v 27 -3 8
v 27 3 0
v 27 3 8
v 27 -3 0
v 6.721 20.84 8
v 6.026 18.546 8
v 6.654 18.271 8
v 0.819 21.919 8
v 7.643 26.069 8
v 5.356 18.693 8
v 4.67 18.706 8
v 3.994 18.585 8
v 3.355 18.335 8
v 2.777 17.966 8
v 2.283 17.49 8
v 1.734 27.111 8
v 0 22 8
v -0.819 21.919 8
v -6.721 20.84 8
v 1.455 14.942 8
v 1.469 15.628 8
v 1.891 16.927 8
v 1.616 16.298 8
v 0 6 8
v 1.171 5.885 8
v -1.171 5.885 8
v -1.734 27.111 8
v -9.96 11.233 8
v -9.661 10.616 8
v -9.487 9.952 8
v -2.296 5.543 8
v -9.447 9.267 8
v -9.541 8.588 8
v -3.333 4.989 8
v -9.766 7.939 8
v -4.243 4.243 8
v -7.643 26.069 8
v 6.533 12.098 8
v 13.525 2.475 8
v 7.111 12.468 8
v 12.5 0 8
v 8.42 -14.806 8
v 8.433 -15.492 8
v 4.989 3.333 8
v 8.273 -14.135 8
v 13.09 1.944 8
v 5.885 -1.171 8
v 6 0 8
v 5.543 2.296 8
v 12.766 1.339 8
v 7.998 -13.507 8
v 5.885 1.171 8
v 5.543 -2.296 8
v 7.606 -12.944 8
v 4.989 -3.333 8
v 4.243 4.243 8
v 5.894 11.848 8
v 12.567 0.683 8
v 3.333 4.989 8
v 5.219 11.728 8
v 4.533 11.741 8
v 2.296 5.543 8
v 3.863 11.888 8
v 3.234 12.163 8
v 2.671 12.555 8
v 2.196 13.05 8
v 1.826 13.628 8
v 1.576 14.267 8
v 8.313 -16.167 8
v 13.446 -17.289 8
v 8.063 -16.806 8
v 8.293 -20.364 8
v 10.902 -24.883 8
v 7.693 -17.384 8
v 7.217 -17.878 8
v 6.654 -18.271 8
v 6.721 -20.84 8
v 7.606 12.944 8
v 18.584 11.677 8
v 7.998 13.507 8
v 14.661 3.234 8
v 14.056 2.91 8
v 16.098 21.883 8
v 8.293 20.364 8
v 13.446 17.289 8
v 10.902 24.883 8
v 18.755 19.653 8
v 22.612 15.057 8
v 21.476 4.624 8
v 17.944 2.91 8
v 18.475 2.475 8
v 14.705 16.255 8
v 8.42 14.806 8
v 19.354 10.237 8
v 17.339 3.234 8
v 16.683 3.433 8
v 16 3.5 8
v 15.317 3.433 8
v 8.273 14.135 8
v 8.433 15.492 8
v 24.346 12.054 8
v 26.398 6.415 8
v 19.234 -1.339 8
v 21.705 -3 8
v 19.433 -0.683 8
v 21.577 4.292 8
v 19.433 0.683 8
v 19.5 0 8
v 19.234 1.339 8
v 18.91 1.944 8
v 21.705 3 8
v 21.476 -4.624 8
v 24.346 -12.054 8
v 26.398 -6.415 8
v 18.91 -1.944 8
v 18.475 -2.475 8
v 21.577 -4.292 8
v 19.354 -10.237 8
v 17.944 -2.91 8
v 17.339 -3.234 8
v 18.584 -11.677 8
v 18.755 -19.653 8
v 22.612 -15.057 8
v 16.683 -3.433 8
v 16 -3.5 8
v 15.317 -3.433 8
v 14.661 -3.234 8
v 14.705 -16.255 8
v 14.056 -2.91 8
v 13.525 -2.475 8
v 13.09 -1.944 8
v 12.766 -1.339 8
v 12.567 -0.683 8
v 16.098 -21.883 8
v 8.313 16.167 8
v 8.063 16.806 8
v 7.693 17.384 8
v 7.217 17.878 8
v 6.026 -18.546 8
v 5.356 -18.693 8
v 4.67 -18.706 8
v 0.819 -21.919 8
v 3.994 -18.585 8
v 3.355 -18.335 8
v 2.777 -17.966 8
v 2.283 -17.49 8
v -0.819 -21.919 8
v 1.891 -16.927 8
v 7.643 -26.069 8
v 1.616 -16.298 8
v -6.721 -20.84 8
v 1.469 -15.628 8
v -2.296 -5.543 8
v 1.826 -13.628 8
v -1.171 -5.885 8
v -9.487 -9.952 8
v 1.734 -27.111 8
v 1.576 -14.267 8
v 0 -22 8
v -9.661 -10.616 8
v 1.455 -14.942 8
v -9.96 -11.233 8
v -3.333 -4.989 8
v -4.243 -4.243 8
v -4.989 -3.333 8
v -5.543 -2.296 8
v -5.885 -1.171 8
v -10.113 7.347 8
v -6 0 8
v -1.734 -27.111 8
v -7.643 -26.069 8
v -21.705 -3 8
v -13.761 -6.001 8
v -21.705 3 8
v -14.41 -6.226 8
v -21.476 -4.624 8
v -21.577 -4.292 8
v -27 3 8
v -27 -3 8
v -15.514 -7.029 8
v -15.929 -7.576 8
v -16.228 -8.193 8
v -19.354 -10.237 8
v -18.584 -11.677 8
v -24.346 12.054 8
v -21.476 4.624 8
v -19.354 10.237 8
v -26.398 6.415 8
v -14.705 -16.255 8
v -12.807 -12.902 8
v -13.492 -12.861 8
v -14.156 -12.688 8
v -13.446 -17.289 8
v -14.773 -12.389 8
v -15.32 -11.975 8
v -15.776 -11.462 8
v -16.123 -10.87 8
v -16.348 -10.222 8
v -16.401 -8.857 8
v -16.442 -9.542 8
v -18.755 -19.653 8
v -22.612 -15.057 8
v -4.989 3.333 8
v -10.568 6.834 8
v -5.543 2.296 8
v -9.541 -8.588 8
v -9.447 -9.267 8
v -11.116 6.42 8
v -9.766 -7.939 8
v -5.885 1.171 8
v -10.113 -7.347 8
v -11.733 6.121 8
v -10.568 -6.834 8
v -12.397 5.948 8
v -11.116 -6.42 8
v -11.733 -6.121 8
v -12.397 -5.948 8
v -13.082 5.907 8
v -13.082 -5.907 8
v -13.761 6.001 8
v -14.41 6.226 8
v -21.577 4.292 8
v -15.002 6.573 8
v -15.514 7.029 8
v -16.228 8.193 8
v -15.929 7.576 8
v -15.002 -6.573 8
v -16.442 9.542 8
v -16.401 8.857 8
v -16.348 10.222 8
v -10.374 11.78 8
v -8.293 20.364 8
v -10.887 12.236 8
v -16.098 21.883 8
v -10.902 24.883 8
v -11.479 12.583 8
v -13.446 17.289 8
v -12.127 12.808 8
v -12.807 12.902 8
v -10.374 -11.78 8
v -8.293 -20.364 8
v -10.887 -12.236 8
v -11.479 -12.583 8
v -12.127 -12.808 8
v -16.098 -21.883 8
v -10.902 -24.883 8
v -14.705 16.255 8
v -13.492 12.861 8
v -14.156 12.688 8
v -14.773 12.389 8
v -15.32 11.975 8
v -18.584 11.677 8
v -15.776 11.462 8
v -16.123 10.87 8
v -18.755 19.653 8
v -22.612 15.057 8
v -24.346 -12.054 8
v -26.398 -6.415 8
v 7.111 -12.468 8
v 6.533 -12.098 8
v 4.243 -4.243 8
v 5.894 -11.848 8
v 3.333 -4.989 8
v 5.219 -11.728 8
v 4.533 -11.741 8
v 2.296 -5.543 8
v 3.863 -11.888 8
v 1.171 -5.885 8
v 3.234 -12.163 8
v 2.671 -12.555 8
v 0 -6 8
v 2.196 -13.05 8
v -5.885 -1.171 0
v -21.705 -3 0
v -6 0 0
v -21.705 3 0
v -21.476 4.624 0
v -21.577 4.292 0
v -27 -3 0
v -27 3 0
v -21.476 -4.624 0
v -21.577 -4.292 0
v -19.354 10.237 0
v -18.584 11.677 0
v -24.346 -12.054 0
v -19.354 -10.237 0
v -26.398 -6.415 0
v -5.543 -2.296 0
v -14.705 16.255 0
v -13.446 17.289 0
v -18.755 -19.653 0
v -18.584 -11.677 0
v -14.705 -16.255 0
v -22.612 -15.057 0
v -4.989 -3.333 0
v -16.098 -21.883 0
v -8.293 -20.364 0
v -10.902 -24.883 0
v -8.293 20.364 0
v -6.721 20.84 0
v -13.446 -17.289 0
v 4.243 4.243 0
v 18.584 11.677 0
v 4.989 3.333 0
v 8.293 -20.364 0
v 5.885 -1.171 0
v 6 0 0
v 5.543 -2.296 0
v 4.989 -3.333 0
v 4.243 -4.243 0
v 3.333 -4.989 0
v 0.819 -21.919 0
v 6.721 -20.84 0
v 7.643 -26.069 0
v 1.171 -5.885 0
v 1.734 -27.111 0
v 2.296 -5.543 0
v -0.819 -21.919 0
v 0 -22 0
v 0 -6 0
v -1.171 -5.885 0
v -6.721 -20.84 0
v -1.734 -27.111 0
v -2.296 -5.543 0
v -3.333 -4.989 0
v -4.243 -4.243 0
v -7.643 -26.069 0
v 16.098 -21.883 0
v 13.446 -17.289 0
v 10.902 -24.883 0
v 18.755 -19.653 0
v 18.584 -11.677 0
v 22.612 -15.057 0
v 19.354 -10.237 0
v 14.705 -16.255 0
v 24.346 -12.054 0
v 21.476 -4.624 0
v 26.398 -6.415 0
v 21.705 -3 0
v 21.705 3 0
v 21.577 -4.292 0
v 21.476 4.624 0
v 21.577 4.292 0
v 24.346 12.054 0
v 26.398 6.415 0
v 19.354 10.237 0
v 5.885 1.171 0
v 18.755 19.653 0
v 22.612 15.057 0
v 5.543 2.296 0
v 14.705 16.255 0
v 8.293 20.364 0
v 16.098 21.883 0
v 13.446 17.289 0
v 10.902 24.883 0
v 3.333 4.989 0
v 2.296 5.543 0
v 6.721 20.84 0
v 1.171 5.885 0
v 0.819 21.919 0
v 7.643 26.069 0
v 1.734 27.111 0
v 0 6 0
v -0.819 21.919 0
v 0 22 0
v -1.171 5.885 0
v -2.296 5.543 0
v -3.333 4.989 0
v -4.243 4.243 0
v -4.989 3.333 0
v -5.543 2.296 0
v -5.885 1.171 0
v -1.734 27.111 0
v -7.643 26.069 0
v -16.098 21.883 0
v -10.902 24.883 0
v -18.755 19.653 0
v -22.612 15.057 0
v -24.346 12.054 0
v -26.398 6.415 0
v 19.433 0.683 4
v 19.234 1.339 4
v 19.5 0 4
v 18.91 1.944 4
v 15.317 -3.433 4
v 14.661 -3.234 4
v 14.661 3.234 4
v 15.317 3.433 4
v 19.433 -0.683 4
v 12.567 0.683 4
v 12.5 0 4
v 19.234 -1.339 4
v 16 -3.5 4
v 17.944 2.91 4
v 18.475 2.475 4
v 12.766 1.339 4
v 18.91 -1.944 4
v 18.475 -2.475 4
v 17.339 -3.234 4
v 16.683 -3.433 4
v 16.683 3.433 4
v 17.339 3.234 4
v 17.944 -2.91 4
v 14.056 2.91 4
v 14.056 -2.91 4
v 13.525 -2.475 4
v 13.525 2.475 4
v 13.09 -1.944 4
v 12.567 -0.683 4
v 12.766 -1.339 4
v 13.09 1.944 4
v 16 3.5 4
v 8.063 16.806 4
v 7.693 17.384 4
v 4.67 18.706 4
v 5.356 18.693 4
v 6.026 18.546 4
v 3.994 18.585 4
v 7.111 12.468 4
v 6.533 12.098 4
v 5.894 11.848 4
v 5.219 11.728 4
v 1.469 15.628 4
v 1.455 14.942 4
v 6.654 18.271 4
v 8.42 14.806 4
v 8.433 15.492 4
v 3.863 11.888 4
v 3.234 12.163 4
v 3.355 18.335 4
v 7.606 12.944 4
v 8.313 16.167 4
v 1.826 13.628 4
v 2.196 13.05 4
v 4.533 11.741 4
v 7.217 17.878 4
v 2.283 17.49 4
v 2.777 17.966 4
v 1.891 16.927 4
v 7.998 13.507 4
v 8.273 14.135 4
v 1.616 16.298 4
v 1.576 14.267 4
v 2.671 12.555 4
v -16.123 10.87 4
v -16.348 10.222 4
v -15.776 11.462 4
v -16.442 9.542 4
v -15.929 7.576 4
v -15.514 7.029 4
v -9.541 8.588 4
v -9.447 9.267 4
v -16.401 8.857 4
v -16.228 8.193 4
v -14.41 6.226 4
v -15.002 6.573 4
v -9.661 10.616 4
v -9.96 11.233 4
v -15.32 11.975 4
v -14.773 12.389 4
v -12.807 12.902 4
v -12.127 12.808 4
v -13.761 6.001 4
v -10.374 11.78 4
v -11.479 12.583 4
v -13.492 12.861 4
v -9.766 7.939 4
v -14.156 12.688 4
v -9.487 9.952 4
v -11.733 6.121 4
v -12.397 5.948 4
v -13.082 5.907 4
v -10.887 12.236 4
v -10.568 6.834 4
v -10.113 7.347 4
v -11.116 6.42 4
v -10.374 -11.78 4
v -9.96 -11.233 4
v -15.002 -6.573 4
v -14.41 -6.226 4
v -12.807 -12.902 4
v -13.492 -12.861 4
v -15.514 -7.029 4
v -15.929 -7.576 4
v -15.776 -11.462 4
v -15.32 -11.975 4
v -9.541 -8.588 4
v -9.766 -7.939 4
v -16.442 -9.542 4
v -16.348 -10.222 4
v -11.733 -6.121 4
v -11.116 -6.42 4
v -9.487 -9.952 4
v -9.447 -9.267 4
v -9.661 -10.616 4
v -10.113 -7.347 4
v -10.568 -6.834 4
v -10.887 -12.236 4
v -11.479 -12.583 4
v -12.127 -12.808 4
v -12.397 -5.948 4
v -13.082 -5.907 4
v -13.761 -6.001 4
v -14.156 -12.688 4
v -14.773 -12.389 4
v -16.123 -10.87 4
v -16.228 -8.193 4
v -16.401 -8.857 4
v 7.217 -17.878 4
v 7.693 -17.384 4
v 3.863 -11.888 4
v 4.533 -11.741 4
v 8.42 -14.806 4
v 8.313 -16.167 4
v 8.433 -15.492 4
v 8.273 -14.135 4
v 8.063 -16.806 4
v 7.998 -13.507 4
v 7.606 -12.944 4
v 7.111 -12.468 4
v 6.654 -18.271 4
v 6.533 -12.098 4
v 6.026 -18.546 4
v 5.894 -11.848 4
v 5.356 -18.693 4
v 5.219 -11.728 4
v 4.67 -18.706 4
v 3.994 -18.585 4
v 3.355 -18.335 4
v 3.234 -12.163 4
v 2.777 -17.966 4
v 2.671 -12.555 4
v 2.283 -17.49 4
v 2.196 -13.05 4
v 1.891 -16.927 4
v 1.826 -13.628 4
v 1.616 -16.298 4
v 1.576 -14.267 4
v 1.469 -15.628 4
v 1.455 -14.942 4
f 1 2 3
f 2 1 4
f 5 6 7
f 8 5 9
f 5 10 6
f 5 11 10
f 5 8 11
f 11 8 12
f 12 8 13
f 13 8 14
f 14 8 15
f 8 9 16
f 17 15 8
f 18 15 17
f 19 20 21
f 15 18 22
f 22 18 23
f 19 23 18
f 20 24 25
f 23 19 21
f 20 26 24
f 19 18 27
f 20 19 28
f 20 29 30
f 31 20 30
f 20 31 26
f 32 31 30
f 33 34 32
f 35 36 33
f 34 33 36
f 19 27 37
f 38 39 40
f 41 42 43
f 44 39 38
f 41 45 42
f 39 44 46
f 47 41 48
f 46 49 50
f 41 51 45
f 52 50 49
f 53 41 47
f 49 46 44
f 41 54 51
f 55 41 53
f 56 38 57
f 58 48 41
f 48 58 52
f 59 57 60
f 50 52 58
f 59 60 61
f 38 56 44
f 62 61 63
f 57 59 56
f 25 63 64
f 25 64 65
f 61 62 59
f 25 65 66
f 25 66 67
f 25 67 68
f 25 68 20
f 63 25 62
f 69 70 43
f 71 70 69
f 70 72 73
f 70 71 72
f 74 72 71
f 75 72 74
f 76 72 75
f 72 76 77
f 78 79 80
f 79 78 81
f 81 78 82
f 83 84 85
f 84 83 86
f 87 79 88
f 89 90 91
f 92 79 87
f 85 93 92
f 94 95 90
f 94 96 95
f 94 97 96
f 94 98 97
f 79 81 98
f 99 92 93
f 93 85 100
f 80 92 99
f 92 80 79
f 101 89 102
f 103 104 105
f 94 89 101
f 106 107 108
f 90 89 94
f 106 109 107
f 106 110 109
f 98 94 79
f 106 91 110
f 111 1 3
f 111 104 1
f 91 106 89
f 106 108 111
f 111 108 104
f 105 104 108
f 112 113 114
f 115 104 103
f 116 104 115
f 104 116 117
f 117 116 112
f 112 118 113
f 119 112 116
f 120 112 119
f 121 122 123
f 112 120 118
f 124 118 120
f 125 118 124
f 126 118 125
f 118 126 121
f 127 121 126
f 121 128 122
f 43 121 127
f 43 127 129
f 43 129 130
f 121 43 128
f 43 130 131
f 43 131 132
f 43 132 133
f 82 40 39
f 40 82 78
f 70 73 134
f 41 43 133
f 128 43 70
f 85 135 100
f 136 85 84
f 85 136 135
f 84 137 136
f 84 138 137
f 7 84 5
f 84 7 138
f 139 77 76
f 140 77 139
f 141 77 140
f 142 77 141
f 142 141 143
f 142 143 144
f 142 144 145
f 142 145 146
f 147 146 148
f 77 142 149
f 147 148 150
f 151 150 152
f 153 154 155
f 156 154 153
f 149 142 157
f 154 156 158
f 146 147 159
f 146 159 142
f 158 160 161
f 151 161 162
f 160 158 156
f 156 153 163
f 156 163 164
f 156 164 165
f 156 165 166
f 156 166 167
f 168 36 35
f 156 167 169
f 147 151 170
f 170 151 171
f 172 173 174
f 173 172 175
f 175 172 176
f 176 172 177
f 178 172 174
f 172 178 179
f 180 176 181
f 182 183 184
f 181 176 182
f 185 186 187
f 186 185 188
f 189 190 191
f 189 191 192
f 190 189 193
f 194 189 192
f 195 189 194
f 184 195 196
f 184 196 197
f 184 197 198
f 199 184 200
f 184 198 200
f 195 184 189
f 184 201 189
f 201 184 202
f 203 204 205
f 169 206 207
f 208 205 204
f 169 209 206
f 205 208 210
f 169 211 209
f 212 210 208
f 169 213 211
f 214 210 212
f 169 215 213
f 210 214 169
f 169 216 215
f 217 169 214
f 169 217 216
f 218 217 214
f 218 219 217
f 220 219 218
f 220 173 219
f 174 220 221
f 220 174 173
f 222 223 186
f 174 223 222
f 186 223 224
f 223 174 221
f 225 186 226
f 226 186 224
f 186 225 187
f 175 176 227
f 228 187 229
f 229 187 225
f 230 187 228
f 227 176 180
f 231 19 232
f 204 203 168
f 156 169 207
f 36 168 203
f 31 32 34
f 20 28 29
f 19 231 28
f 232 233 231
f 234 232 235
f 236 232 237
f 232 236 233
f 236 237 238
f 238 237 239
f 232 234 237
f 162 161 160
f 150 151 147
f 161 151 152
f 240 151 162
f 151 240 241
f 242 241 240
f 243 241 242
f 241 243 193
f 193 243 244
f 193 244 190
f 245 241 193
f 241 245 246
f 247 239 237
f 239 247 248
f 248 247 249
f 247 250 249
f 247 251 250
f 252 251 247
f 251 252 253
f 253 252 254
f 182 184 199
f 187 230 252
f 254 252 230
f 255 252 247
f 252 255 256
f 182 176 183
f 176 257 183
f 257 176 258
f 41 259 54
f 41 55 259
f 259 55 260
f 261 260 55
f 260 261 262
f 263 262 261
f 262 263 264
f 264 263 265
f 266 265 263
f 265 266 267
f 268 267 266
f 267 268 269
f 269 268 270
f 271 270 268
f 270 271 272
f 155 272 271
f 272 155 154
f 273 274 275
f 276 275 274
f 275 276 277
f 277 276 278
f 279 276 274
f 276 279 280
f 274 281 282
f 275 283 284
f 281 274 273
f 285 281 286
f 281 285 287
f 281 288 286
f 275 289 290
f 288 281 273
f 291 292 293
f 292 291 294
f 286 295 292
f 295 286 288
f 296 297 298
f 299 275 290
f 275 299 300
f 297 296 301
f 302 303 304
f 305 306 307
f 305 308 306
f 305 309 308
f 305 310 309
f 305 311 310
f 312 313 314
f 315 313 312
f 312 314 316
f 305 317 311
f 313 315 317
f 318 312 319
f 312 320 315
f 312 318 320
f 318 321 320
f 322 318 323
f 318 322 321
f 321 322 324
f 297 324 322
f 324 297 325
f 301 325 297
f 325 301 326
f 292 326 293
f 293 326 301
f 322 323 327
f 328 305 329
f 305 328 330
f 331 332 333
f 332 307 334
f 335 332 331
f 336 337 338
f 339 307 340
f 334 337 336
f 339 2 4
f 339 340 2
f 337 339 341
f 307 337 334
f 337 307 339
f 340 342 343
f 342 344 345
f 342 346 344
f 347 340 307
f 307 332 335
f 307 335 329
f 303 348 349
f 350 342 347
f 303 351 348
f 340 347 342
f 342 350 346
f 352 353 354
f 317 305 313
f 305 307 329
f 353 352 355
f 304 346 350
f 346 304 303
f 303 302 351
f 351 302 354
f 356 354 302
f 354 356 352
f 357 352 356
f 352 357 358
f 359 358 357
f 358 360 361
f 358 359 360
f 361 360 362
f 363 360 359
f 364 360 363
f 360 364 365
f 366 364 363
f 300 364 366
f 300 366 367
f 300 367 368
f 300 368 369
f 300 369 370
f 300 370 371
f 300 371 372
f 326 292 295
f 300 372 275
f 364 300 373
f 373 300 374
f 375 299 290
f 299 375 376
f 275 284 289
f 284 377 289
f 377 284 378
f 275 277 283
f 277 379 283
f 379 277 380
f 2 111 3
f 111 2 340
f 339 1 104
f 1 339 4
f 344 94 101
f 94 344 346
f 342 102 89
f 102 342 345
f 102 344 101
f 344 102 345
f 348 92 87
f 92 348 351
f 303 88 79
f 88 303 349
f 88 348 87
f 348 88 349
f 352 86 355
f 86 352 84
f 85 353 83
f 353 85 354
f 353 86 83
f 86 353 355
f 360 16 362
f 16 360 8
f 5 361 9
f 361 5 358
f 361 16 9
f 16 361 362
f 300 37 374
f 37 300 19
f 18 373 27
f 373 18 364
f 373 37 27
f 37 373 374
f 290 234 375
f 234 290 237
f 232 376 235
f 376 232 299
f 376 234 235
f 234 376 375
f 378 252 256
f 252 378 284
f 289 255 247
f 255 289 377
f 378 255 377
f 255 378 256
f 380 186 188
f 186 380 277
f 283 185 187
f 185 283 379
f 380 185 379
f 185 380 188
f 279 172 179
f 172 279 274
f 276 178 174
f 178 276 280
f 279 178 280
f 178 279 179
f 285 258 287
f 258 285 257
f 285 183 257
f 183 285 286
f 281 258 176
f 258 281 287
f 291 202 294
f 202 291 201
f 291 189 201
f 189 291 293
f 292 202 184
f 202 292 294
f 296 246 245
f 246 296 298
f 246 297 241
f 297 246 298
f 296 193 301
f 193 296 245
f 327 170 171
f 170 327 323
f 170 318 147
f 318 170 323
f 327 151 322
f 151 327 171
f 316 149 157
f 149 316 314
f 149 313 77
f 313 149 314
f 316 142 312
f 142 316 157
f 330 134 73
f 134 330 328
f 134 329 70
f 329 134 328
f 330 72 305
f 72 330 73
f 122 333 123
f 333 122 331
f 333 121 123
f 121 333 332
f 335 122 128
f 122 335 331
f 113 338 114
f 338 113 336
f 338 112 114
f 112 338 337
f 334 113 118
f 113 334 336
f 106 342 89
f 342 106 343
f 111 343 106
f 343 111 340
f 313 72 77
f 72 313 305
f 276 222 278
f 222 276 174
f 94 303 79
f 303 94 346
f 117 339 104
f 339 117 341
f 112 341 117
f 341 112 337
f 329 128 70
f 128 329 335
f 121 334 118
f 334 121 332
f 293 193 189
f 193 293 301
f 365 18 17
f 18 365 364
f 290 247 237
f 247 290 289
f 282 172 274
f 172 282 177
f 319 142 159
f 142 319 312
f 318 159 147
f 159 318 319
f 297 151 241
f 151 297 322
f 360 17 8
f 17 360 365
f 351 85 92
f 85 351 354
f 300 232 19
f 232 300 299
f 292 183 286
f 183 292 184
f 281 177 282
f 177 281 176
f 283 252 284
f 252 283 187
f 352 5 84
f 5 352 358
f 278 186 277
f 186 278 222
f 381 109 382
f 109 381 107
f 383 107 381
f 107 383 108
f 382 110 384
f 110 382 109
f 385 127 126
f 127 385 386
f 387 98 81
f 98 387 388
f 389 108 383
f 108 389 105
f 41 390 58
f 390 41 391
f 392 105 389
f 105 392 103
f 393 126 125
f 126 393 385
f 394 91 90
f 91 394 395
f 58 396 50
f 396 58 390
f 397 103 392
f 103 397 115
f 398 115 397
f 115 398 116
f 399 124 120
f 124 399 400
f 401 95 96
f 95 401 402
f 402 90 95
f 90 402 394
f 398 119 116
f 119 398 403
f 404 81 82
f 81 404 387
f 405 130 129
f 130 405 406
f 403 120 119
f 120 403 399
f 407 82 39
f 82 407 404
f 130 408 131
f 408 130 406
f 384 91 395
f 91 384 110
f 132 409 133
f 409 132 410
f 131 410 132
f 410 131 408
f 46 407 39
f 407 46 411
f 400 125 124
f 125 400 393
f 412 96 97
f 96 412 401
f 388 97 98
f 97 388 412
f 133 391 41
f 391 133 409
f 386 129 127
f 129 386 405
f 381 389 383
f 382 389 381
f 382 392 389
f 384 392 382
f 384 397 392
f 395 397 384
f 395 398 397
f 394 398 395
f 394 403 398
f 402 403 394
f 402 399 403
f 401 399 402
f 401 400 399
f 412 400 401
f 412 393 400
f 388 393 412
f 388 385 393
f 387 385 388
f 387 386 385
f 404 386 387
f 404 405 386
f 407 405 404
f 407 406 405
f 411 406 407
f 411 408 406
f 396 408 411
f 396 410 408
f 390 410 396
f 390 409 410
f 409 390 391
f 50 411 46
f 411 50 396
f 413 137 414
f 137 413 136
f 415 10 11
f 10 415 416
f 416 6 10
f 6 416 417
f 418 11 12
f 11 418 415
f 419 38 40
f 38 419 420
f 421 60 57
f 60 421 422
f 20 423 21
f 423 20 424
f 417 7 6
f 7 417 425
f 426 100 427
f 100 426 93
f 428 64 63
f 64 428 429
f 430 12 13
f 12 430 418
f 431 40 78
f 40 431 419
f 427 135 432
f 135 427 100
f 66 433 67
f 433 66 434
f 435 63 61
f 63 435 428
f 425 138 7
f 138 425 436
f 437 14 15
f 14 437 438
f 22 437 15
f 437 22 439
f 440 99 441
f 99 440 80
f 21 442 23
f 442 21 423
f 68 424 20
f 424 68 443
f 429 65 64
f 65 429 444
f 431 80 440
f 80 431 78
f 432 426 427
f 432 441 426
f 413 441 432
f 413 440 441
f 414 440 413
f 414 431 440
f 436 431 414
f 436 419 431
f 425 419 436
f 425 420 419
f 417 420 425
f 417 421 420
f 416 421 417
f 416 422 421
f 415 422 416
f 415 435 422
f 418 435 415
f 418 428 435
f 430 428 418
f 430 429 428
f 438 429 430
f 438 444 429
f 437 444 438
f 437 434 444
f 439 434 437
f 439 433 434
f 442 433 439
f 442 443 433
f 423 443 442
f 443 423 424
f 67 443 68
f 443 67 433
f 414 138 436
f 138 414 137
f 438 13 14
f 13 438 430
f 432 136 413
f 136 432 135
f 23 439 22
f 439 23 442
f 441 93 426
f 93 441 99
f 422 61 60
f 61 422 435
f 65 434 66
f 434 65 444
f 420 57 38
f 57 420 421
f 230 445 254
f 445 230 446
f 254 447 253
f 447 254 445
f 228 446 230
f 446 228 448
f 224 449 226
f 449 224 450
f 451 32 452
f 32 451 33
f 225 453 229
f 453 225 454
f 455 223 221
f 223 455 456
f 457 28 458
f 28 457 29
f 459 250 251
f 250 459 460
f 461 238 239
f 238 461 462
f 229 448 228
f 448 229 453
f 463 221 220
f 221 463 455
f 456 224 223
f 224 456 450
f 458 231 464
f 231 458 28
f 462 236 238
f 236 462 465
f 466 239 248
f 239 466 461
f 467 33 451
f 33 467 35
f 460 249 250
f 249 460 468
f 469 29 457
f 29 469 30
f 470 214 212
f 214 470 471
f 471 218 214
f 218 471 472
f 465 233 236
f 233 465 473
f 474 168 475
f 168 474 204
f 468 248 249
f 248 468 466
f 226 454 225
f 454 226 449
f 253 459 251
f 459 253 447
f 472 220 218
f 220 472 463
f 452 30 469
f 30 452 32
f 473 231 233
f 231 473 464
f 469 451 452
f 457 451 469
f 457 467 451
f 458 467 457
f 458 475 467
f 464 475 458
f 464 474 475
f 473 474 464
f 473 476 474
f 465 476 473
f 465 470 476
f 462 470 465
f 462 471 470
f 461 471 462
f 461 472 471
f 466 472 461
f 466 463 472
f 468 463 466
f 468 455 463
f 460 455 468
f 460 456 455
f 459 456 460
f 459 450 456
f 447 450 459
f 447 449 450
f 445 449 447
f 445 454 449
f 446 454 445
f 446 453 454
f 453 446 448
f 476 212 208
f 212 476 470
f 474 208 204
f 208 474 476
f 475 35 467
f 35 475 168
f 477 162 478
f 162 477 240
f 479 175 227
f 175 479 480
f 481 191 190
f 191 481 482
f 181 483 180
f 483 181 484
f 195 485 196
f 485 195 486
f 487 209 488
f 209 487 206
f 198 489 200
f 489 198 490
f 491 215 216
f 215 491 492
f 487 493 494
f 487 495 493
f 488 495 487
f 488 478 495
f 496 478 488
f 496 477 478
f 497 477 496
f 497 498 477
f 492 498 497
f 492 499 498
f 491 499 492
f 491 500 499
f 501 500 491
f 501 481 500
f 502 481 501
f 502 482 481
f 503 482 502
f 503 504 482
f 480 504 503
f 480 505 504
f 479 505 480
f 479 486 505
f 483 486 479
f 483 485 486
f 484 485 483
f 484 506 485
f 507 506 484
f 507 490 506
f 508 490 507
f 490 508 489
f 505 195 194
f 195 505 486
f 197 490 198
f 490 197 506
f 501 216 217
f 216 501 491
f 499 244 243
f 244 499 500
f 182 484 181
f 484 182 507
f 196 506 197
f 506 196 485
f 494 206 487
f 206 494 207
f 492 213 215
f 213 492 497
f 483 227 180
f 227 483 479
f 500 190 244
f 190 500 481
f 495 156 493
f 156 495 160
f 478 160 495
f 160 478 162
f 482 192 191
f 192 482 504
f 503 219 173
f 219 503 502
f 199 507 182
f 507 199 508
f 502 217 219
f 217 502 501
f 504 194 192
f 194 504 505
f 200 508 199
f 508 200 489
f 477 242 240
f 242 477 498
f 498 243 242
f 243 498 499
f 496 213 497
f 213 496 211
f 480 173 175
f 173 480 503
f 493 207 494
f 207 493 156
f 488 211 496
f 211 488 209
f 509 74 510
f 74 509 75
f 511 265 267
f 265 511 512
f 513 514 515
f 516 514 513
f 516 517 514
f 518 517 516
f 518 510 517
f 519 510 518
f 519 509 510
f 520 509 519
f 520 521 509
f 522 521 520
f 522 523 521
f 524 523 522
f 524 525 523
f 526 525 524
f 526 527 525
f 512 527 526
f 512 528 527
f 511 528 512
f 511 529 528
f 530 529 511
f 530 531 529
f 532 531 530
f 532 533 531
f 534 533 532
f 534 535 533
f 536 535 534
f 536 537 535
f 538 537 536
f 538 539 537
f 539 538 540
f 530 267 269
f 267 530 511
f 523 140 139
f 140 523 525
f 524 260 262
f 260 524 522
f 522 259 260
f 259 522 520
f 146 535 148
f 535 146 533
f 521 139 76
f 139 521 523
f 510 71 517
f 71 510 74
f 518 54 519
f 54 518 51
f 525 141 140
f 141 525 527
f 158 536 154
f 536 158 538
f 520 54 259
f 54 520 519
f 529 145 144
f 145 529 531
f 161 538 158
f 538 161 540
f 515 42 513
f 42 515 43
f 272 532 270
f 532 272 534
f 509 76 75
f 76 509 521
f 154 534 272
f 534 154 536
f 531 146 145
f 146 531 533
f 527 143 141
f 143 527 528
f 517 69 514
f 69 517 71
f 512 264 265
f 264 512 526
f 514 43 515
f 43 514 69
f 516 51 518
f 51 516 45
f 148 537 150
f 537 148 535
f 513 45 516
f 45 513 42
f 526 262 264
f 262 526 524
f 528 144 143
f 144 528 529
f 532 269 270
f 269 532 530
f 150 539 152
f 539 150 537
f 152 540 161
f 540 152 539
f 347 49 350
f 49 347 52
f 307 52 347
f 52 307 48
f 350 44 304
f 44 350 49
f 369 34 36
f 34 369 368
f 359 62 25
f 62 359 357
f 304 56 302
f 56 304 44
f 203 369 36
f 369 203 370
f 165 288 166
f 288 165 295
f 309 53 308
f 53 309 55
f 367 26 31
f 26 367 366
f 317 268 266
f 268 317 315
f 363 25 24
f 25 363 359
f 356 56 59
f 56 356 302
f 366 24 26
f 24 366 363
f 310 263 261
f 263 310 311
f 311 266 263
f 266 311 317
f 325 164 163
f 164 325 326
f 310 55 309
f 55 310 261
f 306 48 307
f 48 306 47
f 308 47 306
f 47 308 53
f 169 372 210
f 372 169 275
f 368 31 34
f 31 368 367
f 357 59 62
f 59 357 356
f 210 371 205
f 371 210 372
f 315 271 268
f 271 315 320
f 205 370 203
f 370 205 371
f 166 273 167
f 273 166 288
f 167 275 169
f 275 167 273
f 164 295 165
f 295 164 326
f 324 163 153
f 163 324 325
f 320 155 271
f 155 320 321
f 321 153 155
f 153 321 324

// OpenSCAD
$fn = 32;

// ----------------------------------------------------------------------
// Spur blank: lightened gear blank
// ----------------------------------------------------------------------

// --- parameters (mm) ---
disc_r = 22;              // blank root radius
disc_t = 8;               // blank thickness
n_teeth = 18;             // stub tooth count
tooth_w = 6;              // tooth width at the root
tooth_h = 5;              // tooth height above the root
bore_r = 6;               // central bore radius
ring_r = 16;              // lightening pocket ring radius
pocket_r = 3.5;           // lightening pocket radius
fit_tol = 0.02;           // tolerance for press fits, mm
free_tol = 0.2;           // tolerance for clearance fits, mm

out_r = disc_r + tooth_h;  // tip radius
bbox_x = 54.0;  // measured width over the teeth
bbox_y = 54.22;  // measured depth over the teeth

difference() {
union() {
  cylinder(r = disc_r, h = disc_t);
  for (i = [0 : n_teeth - 1])
    rotate([0, 0, i * 360 / n_teeth])
      translate([disc_r - 1, -tooth_w / 2, 0])
        cube([tooth_h + 1, tooth_w, disc_t]);
}
  translate([0, 0, -1]) cylinder(r = bore_r, h = disc_t + 2);
  for (i = [0 : 5])
    rotate([0, 0, i * 72])
      translate([ring_r, 0, disc_t - 4])
        cylinder(r = pocket_r, h = 5);
}
